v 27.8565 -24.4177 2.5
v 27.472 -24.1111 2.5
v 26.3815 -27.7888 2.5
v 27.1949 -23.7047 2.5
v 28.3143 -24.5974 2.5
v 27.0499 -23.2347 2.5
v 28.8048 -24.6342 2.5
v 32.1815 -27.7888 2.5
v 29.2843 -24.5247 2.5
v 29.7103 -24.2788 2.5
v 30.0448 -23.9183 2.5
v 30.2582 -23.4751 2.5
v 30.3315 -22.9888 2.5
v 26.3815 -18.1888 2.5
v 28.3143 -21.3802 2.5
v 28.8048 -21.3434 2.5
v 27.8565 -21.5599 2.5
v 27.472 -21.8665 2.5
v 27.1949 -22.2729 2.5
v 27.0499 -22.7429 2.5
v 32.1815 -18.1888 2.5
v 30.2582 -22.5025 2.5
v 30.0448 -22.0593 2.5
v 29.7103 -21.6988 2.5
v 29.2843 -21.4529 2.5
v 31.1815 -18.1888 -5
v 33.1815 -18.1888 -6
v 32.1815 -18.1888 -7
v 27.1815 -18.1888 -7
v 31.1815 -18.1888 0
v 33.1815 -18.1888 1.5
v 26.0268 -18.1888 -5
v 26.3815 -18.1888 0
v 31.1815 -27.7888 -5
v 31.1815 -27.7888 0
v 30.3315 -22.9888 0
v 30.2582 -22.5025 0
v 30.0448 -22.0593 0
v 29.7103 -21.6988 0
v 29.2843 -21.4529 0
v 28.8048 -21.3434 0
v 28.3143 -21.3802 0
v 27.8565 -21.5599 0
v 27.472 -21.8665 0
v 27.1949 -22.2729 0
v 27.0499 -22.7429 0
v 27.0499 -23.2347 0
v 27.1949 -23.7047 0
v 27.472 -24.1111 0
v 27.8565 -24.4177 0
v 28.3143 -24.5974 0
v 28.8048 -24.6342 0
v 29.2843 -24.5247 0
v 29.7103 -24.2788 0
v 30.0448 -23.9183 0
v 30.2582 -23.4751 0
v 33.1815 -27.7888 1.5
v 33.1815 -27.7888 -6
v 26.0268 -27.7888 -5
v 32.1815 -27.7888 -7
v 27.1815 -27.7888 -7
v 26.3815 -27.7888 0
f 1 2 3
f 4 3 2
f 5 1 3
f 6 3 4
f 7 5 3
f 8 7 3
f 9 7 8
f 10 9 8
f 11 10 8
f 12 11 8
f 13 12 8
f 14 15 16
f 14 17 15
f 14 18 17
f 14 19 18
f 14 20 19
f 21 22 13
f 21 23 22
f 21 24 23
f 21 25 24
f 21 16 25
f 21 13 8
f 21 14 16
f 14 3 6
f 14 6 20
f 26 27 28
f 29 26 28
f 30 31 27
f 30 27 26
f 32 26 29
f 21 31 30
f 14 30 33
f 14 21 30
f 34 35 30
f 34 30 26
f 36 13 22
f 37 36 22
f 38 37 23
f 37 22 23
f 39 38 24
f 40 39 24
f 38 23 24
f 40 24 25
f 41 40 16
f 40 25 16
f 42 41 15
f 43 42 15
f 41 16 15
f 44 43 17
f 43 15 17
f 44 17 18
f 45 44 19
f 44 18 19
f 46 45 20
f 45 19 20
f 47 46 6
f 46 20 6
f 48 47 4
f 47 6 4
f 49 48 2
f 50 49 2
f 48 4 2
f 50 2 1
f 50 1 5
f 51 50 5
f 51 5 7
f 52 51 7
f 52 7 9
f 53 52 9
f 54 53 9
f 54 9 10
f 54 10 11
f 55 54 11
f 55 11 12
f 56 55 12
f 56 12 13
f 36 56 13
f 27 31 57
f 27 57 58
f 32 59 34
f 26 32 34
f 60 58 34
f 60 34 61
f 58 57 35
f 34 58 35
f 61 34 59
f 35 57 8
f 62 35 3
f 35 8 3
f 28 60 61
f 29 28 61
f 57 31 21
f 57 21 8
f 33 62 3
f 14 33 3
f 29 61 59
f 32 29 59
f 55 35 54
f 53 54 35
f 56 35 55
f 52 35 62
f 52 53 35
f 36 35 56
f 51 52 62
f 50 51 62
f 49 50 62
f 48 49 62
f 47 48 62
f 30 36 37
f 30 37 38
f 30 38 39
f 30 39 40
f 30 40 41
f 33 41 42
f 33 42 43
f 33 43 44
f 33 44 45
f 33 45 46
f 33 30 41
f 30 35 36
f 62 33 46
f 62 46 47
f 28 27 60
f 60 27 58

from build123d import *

# Parameters (mm, degrees)
BOSS_EXTRUDE1_START = 0.2
BOSS_EXTRUDE1_DEPTH = 9.6
SKETCH3_R           = 1.65
CUT_EXTRUDE1_DEPTH  = 5
CHAMFER1_SIZE       = 1


with BuildPart() as part:
    # Sketch2 → Boss-Extrude1 (new body)
    with BuildSketch(Plane.XZ.offset(17.988801204).offset(BOSS_EXTRUDE1_START)):
        Polygon((26.026797653, -5), (31.181498191, -5), (31.181498191, -2.5), (31.181498191, 0), (26.381498191, 0), (26.381498191, 2.5), (33.181498191, 2.5), (33.181498191, -7), (27.181498191, -7), align=None)
    extrude(amount=BOSS_EXTRUDE1_DEPTH)

    # Sketch3 → Cut-Extrude1 (cut)
    with BuildSketch(Plane.XY.offset(2.5)):
        with Locations((28.681498191, -22.988801204)):
            Circle(SKETCH3_R)
    extrude(amount=-CUT_EXTRUDE1_DEPTH, mode=Mode.SUBTRACT)

    # Chamfer1
    chamfer1_edges = [part.edges().sort_by_distance(p)[0] for p in [
        (33.181498191, -22.988801204, -7),
        (33.181498191, -22.988801204, 2.5),
    ]]
    chamfer(chamfer1_edges, length=CHAMFER1_SIZE)


solid = part.part
